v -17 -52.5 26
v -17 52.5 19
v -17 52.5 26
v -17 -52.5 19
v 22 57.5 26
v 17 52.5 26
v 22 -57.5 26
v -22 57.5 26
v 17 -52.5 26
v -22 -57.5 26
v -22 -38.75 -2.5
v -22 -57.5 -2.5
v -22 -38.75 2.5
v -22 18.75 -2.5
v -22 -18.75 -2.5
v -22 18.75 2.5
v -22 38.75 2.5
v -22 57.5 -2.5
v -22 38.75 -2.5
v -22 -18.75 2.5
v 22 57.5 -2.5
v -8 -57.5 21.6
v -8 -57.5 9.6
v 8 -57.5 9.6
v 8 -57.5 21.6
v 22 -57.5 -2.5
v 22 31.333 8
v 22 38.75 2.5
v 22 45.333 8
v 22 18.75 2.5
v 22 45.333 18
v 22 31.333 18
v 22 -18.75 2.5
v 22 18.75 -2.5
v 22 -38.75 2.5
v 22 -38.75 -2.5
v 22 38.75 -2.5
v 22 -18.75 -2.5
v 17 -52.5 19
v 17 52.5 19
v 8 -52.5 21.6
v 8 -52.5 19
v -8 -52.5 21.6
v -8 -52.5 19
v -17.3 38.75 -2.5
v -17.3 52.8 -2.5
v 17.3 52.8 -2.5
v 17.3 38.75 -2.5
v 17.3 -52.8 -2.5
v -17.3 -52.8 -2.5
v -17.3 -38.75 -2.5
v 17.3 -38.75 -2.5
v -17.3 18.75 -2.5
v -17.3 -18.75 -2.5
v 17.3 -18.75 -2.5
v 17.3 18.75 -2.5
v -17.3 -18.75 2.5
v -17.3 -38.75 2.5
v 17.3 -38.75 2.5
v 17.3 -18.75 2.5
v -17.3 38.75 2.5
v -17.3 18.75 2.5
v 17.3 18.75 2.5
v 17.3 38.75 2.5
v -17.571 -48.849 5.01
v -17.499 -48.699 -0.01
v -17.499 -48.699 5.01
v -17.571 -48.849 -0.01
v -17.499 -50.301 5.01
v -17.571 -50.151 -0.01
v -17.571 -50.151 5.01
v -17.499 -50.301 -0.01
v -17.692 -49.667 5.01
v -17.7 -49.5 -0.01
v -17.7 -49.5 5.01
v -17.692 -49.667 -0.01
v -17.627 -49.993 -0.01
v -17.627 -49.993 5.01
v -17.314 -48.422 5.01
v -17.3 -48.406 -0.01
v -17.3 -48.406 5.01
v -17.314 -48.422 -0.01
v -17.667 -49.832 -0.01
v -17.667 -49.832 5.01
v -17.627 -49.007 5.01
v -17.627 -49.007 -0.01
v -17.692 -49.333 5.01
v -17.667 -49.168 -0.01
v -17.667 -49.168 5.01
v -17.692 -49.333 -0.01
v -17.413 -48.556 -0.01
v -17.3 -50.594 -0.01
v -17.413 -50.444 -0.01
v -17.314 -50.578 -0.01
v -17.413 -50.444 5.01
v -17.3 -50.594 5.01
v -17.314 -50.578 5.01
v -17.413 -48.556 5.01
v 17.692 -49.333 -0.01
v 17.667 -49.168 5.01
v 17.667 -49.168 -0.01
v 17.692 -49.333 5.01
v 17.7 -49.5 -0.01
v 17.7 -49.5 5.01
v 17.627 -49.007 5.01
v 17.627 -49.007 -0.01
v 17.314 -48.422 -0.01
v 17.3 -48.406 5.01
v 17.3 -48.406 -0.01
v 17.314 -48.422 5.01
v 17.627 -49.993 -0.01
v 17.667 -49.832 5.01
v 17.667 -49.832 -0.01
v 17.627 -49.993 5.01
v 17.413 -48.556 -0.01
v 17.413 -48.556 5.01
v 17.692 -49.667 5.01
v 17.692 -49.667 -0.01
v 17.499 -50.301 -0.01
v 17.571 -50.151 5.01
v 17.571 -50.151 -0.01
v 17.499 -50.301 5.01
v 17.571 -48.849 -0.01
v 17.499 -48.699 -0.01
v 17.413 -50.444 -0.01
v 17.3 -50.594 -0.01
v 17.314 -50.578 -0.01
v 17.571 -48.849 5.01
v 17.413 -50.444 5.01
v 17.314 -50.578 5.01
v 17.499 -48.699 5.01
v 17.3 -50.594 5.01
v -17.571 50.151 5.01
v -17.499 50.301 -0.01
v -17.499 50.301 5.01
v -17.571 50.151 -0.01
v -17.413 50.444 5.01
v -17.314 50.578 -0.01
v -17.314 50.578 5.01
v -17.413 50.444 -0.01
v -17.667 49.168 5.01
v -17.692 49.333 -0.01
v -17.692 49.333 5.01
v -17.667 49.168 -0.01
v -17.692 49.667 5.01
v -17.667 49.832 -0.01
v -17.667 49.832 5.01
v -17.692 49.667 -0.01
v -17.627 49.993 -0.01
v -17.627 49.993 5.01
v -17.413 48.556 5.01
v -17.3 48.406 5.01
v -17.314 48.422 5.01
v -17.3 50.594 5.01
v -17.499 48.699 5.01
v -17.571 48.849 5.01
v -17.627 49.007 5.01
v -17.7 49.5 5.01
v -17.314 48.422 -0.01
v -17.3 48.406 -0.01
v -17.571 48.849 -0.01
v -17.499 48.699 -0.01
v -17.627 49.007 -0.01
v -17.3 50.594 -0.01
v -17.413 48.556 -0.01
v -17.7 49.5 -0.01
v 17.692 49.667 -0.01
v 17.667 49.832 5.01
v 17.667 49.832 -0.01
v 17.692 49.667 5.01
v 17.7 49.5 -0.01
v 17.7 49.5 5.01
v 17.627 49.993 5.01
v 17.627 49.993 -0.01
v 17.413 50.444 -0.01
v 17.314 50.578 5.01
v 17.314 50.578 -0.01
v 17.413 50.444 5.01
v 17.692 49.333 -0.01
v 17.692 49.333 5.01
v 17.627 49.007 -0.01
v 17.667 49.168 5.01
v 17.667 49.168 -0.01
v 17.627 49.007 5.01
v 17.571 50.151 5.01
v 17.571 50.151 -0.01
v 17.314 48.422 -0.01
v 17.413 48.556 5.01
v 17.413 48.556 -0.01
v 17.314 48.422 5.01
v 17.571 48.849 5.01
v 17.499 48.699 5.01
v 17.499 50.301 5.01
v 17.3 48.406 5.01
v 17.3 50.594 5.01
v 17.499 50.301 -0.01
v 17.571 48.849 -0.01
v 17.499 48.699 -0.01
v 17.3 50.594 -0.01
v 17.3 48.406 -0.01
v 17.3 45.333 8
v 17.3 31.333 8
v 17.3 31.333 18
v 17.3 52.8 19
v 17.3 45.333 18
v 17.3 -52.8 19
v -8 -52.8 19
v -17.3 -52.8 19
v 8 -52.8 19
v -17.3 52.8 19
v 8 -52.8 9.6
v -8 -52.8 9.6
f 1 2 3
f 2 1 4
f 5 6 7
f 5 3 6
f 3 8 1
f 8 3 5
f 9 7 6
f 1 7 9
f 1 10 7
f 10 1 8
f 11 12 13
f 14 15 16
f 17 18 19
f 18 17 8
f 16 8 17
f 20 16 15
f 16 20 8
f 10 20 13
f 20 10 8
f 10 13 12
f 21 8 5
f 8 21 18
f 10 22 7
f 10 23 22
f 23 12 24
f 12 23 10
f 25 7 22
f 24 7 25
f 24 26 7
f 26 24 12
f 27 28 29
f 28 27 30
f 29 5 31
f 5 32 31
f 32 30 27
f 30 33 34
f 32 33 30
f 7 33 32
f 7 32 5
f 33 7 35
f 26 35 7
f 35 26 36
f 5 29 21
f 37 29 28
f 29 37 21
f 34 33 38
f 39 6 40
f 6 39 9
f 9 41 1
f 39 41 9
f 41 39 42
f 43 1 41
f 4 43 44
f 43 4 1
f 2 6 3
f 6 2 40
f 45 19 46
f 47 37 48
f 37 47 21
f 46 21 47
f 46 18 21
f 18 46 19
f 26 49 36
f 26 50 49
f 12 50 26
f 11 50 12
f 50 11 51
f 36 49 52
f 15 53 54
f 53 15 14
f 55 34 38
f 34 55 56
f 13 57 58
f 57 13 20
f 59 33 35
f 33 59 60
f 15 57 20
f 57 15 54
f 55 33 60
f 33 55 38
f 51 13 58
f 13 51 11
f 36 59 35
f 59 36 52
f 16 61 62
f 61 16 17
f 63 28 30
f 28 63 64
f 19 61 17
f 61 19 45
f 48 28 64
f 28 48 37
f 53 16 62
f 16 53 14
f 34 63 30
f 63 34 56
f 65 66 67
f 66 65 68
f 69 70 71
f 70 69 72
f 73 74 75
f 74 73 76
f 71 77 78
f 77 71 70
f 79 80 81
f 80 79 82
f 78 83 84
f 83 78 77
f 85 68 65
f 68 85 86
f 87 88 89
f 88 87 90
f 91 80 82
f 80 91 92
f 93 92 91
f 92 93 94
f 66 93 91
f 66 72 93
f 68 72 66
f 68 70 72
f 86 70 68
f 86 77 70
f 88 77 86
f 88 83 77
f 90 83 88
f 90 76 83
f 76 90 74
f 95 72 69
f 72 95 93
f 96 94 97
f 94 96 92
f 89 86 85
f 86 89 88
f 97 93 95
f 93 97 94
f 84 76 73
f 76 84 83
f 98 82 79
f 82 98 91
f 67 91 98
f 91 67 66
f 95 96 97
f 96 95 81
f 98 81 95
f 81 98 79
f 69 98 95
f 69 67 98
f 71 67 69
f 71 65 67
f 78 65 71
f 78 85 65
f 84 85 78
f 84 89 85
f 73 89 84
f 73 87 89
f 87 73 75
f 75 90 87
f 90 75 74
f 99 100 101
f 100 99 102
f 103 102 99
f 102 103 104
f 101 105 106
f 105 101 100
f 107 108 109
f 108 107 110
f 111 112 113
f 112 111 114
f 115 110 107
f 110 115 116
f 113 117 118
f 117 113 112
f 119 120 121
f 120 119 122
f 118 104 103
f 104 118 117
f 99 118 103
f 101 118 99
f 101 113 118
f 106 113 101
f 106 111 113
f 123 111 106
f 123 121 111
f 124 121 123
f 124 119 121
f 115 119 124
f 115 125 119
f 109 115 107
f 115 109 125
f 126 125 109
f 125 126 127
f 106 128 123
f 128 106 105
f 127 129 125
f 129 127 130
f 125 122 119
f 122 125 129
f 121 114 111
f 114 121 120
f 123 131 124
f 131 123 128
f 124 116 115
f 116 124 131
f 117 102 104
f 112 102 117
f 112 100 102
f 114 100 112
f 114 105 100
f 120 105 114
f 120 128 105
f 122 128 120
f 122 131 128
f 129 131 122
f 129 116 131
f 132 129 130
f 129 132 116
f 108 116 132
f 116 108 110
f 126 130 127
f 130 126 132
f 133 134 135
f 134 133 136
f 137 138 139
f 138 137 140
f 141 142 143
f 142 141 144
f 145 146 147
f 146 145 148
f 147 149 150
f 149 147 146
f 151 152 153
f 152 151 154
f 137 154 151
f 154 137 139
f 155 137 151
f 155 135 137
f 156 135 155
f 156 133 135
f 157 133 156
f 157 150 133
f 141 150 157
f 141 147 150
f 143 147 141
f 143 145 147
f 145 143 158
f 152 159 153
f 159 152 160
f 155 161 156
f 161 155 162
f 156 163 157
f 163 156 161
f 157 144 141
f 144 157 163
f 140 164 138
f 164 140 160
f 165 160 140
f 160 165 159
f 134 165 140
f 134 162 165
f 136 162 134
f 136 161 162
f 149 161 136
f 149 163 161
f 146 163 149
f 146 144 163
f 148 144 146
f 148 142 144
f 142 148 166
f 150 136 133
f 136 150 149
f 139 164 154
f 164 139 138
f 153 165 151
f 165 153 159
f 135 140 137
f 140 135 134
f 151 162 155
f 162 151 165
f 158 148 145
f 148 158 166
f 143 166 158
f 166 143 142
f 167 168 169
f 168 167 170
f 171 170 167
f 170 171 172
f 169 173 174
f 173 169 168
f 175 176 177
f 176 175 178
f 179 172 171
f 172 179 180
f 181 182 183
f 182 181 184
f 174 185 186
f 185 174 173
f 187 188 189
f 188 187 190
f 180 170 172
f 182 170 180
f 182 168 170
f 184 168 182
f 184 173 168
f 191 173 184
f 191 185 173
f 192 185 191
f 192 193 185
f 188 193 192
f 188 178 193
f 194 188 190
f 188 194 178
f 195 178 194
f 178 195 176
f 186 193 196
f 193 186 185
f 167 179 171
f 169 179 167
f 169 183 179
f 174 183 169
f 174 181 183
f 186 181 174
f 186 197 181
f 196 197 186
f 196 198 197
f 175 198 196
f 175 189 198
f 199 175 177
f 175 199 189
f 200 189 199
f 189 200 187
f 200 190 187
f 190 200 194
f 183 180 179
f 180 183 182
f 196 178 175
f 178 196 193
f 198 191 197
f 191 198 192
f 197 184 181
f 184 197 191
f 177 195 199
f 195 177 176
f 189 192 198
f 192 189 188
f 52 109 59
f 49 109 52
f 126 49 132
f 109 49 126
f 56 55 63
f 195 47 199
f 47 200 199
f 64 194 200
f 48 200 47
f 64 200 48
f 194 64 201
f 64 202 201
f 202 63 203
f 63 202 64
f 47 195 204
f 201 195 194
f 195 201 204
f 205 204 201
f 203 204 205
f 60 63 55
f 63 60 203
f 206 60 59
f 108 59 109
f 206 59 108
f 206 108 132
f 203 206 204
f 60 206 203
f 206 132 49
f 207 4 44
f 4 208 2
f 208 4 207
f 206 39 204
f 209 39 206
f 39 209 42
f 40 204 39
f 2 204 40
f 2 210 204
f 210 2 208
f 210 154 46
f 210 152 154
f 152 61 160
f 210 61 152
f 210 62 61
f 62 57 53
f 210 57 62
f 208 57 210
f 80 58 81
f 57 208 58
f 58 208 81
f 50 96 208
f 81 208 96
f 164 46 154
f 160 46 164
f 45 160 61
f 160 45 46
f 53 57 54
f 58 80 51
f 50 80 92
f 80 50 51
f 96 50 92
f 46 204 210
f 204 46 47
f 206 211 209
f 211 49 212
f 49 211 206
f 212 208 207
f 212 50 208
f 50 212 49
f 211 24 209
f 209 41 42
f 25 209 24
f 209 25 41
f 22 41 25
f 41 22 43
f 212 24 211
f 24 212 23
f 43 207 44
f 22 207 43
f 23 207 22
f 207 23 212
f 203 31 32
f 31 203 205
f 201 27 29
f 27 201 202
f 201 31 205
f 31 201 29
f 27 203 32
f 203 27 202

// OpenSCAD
// file: params.scad
// ============================================================================
//  Робосумо 3 кг — спільні параметри
//  Усі розміри в міліметрах. Прав завжди тут, а не в окремих деталях.
//
//  Позначки:
//    ✅  підтверджено з даташита виробника
//    ❓  VERIFY — виміряй свою деталь штангенциркулем і виправ
// ============================================================================

// --- габарит робота ---------------------------------------------------------
CHASSIS_W       = 200;      // ✅ ліміт класу 200 x 200 мм
CHASSIS_L       = 200;
PLATE_T         = 6;        // товщина друкованого прототипу основи
ALLOY_T         = 4;        // товщина алюмінієвої бойової основи

// --- колеса -----------------------------------------------------------------
WHEEL_D         = 50;
WHEEL_W         = 15;
WHEEL_TRACK     = 150;      // між центрами коліс уздовж осі X
WHEELBASE       = 130;      // між центрами коліс уздовж осі Y

// --- мотор Pololu 37D (✅ усі з pololu.com/product/4745) --------------------
MOTOR_BODY_D    = 37;       // ✅ діаметр корпусу редуктора
MOTOR_SHAFT_D   = 6;        // ✅ D-подібний вал
MOTOR_SHAFT_L   = 16;       // ✅ довжина вала
MOTOR_HEX_PITCH = 15.5;     // ✅ суміжні отвори кріплення, правильний шестикутник
MOTOR_HEX_R     = MOTOR_HEX_PITCH / sqrt(3);   // ≈ 8.949 радіус описаного кола
MOTOR_SCREW_MAX = 3;        // ✅ Pololu: НЕ закручувати глибше 3 мм — дістане шестерні
MOTOR_TOTAL_L   = 57;       // ✅ 37Dx57L

// --- кріплення --------------------------------------------------------------
M3_CLEAR        = 3.4;
M3_TAP          = 2.9;
M2_CLEAR        = 2.2;
HEATSET_M3_D    = 4.0;      // отвір під термозакладну гайку M3
HEATSET_M3_H    = 5.7;

// --- плати (❓ виміряй свої) ------------------------------------------------
NANO_W          = 18;       // ✅ стандарт Arduino Nano
NANO_L          = 45;
NANO_HOLE_DX    = 15.24;    // ✅ 0.6 дюйма
NANO_HOLE_DY    = 43.18;    // ✅ 1.7 дюйма

BTS_W           = 25;       // ❓ VERIFY — плата BTS7960 / IBT-2
BTS_L           = 50;       // ❓ VERIFY
BTS_HOLE_DX     = 15;       // ❓ VERIFY
BTS_HOLE_DY     = 44;       // ❓ VERIFY
BTS_QTY         = 4;

QTR_W           = 12;       // ❓ VERIFY — Pololu QTR-8A
QTR_L           = 75;       // ❓ VERIFY
QTR_HOLE_DX     = 10;       // ❓ VERIFY
QTR_HOLE_DY     = 67;       // ❓ VERIFY

// --- акумулятор (❓ виміряй свій) -------------------------------------------
LIP_W           = 34;       // ❓ VERIFY — 6S 2200 мА·год
LIP_L           = 105;      // ❓ VERIFY
LIP_H           = 26;       // ❓ VERIFY

// --- клин -------------------------------------------------------------------
BLADE_W         = 190;
BLADE_T         = 3;
BLADE_ANGLE     = 12;       // ✅ наш вибір: 8–12° за «Blackbook»
BLADE_SCREWS    = 4;

// --- серво ------------------------------------------------------------------
SERVO_W         = 23;       // SG90
SERVO_L         = 32.5;
SERVO_H         = 29;

// --- магніти -----------------------------------------------------------------
MAG_W           = 20;       // 20 x 20 x 5 мм N52
MAG_D           = 5;

// --- якість друку -----------------------------------------------------------
$fn = 64;                   // гладкість круглих отворів
EPS = 0.01;                 // мікро-перекриття для булевих операцій

// ============================================================================
//  Допоміжні модулі
// ============================================================================

// Отвір під гвинт M3 з фаскою, щоб гвинт сідав рівно
module m3_hole(h = 20, head = true) {
    cylinder(d = M3_CLEAR, h = h + 2*EPS, center = true);
    if (head)
        translate([0, 0, h/2])
            cylinder(d1 = M3_CLEAR, d2 = 6.2, h = 1.6);
}

// Отвір під термозакладну гайку M3 (зверху вниз)
module heatset_hole() {
    cylinder(d = HEATSET_M3_D, h = HEATSET_M3_H, center = false);
    translate([0, 0, HEATSET_M3_H])
        cylinder(d = M3_CLEAR, h = 20);
}

// Шість отворів кріплення мотора 37D на правильному шестикутнику.
// Суміжні отвори рознесені рівно на MOTOR_HEX_PITCH.
module motor_mount_holes(depth = 20) {
    for (a = [0 : 60 : 359])
        rotate([0, 0, a])
            translate([MOTOR_HEX_R, 0, 0])
                cylinder(d = M3_CLEAR, h = depth + 2*EPS, center = true);
}

// Шестикутна кишеня під корпус мотора — щоб мотор сів у площину
module motor_body_pocket(depth = 2) {
    translate([0, 0, -depth/2])
        cylinder(d = MOTOR_BODY_D + 0.4, h = depth + EPS, center = true);
}

// Масив отворів по колу — для маточин і фланців
module bolt_circle(dia, n, hole_d = M3_CLEAR, depth = 20) {
    for (i = [0 : n-1])
        rotate([0, 0, i * 360 / n])
            translate([dia/2, 0, 0])
                cylinder(d = hole_d, h = depth + 2*EPS, center = true);
}

// Плита зі скругленими кутами
module rounded_plate(w, h, t, r = 8) {
    linear_extrude(height = t)
        offset(r = r) offset(delta = -r)
            square([w - 2*r, h - 2*r], center = true);
}
// main file
// ============================================================================
//  07 — Ложемент 6S LiPo
//  Тримає пак так, щоб він не зсувався під ударом. Знизу — зазор для
//  ременя, зверху відкрито для заміни за секунди.
// ============================================================================

include <params.scad>

TRAY_WALL   = 5;
TRAY_T      = 5;
STRAP_W     = 20;       // ширина липучки-ременя

module battery_tray() {
    W = LIP_W + 2 * TRAY_WALL;
    L = LIP_L + 2 * TRAY_WALL;

    difference() {
        union() {
            // днище
            cube([W, L, TRAY_T], center = true);

            // дві бокові стінки вздовж довгої осі
            for (sx = [-1, 1])
                translate([sx * (W/2 - TRAY_WALL/2), 0, LIP_H/2])
                    cube([TRAY_WALL, L, LIP_H], center = true);

            // торцеві стінки
            for (sy = [-1, 1])
                translate([0, sy * (L/2 - TRAY_WALL/2), LIP_H/2])
                    cube([W, TRAY_WALL, LIP_H], center = true);
        }

        // кишеня під пак
        translate([0, 0, TRAY_T])
            cube([LIP_W + 0.6, LIP_L + 0.6, LIP_H + 2], center = true);

        // пази під ремінь — два, щоб пак не гойдався
        for (y = [-L/4, L/4])
            translate([0, y, -EPS])
                cube([W + 4, STRAP_W, TRAY_T + 2*EPS], center = true);

        // отвори кріплення до основи
        for (y = [-L/2 + 8, L/2 - 8], x = [-W/2 + 6, W/2 - 6])
            translate([x, y, -EPS])
                cylinder(d = M3_CLEAR, h = TRAY_T + 2*EPS);

        // вирізи для силових проводів і балансирного роз'єму
        translate([0, -L/2 + TRAY_WALL/2, LIP_H * 0.6])
            cube([16, TRAY_WALL + 4, 12], center = true);
        translate([W/2 - TRAY_WALL/2, L/3, LIP_H * 0.5])
            cube([TRAY_WALL + 4, 14, 10], center = true);
    }
}

battery_tray();
